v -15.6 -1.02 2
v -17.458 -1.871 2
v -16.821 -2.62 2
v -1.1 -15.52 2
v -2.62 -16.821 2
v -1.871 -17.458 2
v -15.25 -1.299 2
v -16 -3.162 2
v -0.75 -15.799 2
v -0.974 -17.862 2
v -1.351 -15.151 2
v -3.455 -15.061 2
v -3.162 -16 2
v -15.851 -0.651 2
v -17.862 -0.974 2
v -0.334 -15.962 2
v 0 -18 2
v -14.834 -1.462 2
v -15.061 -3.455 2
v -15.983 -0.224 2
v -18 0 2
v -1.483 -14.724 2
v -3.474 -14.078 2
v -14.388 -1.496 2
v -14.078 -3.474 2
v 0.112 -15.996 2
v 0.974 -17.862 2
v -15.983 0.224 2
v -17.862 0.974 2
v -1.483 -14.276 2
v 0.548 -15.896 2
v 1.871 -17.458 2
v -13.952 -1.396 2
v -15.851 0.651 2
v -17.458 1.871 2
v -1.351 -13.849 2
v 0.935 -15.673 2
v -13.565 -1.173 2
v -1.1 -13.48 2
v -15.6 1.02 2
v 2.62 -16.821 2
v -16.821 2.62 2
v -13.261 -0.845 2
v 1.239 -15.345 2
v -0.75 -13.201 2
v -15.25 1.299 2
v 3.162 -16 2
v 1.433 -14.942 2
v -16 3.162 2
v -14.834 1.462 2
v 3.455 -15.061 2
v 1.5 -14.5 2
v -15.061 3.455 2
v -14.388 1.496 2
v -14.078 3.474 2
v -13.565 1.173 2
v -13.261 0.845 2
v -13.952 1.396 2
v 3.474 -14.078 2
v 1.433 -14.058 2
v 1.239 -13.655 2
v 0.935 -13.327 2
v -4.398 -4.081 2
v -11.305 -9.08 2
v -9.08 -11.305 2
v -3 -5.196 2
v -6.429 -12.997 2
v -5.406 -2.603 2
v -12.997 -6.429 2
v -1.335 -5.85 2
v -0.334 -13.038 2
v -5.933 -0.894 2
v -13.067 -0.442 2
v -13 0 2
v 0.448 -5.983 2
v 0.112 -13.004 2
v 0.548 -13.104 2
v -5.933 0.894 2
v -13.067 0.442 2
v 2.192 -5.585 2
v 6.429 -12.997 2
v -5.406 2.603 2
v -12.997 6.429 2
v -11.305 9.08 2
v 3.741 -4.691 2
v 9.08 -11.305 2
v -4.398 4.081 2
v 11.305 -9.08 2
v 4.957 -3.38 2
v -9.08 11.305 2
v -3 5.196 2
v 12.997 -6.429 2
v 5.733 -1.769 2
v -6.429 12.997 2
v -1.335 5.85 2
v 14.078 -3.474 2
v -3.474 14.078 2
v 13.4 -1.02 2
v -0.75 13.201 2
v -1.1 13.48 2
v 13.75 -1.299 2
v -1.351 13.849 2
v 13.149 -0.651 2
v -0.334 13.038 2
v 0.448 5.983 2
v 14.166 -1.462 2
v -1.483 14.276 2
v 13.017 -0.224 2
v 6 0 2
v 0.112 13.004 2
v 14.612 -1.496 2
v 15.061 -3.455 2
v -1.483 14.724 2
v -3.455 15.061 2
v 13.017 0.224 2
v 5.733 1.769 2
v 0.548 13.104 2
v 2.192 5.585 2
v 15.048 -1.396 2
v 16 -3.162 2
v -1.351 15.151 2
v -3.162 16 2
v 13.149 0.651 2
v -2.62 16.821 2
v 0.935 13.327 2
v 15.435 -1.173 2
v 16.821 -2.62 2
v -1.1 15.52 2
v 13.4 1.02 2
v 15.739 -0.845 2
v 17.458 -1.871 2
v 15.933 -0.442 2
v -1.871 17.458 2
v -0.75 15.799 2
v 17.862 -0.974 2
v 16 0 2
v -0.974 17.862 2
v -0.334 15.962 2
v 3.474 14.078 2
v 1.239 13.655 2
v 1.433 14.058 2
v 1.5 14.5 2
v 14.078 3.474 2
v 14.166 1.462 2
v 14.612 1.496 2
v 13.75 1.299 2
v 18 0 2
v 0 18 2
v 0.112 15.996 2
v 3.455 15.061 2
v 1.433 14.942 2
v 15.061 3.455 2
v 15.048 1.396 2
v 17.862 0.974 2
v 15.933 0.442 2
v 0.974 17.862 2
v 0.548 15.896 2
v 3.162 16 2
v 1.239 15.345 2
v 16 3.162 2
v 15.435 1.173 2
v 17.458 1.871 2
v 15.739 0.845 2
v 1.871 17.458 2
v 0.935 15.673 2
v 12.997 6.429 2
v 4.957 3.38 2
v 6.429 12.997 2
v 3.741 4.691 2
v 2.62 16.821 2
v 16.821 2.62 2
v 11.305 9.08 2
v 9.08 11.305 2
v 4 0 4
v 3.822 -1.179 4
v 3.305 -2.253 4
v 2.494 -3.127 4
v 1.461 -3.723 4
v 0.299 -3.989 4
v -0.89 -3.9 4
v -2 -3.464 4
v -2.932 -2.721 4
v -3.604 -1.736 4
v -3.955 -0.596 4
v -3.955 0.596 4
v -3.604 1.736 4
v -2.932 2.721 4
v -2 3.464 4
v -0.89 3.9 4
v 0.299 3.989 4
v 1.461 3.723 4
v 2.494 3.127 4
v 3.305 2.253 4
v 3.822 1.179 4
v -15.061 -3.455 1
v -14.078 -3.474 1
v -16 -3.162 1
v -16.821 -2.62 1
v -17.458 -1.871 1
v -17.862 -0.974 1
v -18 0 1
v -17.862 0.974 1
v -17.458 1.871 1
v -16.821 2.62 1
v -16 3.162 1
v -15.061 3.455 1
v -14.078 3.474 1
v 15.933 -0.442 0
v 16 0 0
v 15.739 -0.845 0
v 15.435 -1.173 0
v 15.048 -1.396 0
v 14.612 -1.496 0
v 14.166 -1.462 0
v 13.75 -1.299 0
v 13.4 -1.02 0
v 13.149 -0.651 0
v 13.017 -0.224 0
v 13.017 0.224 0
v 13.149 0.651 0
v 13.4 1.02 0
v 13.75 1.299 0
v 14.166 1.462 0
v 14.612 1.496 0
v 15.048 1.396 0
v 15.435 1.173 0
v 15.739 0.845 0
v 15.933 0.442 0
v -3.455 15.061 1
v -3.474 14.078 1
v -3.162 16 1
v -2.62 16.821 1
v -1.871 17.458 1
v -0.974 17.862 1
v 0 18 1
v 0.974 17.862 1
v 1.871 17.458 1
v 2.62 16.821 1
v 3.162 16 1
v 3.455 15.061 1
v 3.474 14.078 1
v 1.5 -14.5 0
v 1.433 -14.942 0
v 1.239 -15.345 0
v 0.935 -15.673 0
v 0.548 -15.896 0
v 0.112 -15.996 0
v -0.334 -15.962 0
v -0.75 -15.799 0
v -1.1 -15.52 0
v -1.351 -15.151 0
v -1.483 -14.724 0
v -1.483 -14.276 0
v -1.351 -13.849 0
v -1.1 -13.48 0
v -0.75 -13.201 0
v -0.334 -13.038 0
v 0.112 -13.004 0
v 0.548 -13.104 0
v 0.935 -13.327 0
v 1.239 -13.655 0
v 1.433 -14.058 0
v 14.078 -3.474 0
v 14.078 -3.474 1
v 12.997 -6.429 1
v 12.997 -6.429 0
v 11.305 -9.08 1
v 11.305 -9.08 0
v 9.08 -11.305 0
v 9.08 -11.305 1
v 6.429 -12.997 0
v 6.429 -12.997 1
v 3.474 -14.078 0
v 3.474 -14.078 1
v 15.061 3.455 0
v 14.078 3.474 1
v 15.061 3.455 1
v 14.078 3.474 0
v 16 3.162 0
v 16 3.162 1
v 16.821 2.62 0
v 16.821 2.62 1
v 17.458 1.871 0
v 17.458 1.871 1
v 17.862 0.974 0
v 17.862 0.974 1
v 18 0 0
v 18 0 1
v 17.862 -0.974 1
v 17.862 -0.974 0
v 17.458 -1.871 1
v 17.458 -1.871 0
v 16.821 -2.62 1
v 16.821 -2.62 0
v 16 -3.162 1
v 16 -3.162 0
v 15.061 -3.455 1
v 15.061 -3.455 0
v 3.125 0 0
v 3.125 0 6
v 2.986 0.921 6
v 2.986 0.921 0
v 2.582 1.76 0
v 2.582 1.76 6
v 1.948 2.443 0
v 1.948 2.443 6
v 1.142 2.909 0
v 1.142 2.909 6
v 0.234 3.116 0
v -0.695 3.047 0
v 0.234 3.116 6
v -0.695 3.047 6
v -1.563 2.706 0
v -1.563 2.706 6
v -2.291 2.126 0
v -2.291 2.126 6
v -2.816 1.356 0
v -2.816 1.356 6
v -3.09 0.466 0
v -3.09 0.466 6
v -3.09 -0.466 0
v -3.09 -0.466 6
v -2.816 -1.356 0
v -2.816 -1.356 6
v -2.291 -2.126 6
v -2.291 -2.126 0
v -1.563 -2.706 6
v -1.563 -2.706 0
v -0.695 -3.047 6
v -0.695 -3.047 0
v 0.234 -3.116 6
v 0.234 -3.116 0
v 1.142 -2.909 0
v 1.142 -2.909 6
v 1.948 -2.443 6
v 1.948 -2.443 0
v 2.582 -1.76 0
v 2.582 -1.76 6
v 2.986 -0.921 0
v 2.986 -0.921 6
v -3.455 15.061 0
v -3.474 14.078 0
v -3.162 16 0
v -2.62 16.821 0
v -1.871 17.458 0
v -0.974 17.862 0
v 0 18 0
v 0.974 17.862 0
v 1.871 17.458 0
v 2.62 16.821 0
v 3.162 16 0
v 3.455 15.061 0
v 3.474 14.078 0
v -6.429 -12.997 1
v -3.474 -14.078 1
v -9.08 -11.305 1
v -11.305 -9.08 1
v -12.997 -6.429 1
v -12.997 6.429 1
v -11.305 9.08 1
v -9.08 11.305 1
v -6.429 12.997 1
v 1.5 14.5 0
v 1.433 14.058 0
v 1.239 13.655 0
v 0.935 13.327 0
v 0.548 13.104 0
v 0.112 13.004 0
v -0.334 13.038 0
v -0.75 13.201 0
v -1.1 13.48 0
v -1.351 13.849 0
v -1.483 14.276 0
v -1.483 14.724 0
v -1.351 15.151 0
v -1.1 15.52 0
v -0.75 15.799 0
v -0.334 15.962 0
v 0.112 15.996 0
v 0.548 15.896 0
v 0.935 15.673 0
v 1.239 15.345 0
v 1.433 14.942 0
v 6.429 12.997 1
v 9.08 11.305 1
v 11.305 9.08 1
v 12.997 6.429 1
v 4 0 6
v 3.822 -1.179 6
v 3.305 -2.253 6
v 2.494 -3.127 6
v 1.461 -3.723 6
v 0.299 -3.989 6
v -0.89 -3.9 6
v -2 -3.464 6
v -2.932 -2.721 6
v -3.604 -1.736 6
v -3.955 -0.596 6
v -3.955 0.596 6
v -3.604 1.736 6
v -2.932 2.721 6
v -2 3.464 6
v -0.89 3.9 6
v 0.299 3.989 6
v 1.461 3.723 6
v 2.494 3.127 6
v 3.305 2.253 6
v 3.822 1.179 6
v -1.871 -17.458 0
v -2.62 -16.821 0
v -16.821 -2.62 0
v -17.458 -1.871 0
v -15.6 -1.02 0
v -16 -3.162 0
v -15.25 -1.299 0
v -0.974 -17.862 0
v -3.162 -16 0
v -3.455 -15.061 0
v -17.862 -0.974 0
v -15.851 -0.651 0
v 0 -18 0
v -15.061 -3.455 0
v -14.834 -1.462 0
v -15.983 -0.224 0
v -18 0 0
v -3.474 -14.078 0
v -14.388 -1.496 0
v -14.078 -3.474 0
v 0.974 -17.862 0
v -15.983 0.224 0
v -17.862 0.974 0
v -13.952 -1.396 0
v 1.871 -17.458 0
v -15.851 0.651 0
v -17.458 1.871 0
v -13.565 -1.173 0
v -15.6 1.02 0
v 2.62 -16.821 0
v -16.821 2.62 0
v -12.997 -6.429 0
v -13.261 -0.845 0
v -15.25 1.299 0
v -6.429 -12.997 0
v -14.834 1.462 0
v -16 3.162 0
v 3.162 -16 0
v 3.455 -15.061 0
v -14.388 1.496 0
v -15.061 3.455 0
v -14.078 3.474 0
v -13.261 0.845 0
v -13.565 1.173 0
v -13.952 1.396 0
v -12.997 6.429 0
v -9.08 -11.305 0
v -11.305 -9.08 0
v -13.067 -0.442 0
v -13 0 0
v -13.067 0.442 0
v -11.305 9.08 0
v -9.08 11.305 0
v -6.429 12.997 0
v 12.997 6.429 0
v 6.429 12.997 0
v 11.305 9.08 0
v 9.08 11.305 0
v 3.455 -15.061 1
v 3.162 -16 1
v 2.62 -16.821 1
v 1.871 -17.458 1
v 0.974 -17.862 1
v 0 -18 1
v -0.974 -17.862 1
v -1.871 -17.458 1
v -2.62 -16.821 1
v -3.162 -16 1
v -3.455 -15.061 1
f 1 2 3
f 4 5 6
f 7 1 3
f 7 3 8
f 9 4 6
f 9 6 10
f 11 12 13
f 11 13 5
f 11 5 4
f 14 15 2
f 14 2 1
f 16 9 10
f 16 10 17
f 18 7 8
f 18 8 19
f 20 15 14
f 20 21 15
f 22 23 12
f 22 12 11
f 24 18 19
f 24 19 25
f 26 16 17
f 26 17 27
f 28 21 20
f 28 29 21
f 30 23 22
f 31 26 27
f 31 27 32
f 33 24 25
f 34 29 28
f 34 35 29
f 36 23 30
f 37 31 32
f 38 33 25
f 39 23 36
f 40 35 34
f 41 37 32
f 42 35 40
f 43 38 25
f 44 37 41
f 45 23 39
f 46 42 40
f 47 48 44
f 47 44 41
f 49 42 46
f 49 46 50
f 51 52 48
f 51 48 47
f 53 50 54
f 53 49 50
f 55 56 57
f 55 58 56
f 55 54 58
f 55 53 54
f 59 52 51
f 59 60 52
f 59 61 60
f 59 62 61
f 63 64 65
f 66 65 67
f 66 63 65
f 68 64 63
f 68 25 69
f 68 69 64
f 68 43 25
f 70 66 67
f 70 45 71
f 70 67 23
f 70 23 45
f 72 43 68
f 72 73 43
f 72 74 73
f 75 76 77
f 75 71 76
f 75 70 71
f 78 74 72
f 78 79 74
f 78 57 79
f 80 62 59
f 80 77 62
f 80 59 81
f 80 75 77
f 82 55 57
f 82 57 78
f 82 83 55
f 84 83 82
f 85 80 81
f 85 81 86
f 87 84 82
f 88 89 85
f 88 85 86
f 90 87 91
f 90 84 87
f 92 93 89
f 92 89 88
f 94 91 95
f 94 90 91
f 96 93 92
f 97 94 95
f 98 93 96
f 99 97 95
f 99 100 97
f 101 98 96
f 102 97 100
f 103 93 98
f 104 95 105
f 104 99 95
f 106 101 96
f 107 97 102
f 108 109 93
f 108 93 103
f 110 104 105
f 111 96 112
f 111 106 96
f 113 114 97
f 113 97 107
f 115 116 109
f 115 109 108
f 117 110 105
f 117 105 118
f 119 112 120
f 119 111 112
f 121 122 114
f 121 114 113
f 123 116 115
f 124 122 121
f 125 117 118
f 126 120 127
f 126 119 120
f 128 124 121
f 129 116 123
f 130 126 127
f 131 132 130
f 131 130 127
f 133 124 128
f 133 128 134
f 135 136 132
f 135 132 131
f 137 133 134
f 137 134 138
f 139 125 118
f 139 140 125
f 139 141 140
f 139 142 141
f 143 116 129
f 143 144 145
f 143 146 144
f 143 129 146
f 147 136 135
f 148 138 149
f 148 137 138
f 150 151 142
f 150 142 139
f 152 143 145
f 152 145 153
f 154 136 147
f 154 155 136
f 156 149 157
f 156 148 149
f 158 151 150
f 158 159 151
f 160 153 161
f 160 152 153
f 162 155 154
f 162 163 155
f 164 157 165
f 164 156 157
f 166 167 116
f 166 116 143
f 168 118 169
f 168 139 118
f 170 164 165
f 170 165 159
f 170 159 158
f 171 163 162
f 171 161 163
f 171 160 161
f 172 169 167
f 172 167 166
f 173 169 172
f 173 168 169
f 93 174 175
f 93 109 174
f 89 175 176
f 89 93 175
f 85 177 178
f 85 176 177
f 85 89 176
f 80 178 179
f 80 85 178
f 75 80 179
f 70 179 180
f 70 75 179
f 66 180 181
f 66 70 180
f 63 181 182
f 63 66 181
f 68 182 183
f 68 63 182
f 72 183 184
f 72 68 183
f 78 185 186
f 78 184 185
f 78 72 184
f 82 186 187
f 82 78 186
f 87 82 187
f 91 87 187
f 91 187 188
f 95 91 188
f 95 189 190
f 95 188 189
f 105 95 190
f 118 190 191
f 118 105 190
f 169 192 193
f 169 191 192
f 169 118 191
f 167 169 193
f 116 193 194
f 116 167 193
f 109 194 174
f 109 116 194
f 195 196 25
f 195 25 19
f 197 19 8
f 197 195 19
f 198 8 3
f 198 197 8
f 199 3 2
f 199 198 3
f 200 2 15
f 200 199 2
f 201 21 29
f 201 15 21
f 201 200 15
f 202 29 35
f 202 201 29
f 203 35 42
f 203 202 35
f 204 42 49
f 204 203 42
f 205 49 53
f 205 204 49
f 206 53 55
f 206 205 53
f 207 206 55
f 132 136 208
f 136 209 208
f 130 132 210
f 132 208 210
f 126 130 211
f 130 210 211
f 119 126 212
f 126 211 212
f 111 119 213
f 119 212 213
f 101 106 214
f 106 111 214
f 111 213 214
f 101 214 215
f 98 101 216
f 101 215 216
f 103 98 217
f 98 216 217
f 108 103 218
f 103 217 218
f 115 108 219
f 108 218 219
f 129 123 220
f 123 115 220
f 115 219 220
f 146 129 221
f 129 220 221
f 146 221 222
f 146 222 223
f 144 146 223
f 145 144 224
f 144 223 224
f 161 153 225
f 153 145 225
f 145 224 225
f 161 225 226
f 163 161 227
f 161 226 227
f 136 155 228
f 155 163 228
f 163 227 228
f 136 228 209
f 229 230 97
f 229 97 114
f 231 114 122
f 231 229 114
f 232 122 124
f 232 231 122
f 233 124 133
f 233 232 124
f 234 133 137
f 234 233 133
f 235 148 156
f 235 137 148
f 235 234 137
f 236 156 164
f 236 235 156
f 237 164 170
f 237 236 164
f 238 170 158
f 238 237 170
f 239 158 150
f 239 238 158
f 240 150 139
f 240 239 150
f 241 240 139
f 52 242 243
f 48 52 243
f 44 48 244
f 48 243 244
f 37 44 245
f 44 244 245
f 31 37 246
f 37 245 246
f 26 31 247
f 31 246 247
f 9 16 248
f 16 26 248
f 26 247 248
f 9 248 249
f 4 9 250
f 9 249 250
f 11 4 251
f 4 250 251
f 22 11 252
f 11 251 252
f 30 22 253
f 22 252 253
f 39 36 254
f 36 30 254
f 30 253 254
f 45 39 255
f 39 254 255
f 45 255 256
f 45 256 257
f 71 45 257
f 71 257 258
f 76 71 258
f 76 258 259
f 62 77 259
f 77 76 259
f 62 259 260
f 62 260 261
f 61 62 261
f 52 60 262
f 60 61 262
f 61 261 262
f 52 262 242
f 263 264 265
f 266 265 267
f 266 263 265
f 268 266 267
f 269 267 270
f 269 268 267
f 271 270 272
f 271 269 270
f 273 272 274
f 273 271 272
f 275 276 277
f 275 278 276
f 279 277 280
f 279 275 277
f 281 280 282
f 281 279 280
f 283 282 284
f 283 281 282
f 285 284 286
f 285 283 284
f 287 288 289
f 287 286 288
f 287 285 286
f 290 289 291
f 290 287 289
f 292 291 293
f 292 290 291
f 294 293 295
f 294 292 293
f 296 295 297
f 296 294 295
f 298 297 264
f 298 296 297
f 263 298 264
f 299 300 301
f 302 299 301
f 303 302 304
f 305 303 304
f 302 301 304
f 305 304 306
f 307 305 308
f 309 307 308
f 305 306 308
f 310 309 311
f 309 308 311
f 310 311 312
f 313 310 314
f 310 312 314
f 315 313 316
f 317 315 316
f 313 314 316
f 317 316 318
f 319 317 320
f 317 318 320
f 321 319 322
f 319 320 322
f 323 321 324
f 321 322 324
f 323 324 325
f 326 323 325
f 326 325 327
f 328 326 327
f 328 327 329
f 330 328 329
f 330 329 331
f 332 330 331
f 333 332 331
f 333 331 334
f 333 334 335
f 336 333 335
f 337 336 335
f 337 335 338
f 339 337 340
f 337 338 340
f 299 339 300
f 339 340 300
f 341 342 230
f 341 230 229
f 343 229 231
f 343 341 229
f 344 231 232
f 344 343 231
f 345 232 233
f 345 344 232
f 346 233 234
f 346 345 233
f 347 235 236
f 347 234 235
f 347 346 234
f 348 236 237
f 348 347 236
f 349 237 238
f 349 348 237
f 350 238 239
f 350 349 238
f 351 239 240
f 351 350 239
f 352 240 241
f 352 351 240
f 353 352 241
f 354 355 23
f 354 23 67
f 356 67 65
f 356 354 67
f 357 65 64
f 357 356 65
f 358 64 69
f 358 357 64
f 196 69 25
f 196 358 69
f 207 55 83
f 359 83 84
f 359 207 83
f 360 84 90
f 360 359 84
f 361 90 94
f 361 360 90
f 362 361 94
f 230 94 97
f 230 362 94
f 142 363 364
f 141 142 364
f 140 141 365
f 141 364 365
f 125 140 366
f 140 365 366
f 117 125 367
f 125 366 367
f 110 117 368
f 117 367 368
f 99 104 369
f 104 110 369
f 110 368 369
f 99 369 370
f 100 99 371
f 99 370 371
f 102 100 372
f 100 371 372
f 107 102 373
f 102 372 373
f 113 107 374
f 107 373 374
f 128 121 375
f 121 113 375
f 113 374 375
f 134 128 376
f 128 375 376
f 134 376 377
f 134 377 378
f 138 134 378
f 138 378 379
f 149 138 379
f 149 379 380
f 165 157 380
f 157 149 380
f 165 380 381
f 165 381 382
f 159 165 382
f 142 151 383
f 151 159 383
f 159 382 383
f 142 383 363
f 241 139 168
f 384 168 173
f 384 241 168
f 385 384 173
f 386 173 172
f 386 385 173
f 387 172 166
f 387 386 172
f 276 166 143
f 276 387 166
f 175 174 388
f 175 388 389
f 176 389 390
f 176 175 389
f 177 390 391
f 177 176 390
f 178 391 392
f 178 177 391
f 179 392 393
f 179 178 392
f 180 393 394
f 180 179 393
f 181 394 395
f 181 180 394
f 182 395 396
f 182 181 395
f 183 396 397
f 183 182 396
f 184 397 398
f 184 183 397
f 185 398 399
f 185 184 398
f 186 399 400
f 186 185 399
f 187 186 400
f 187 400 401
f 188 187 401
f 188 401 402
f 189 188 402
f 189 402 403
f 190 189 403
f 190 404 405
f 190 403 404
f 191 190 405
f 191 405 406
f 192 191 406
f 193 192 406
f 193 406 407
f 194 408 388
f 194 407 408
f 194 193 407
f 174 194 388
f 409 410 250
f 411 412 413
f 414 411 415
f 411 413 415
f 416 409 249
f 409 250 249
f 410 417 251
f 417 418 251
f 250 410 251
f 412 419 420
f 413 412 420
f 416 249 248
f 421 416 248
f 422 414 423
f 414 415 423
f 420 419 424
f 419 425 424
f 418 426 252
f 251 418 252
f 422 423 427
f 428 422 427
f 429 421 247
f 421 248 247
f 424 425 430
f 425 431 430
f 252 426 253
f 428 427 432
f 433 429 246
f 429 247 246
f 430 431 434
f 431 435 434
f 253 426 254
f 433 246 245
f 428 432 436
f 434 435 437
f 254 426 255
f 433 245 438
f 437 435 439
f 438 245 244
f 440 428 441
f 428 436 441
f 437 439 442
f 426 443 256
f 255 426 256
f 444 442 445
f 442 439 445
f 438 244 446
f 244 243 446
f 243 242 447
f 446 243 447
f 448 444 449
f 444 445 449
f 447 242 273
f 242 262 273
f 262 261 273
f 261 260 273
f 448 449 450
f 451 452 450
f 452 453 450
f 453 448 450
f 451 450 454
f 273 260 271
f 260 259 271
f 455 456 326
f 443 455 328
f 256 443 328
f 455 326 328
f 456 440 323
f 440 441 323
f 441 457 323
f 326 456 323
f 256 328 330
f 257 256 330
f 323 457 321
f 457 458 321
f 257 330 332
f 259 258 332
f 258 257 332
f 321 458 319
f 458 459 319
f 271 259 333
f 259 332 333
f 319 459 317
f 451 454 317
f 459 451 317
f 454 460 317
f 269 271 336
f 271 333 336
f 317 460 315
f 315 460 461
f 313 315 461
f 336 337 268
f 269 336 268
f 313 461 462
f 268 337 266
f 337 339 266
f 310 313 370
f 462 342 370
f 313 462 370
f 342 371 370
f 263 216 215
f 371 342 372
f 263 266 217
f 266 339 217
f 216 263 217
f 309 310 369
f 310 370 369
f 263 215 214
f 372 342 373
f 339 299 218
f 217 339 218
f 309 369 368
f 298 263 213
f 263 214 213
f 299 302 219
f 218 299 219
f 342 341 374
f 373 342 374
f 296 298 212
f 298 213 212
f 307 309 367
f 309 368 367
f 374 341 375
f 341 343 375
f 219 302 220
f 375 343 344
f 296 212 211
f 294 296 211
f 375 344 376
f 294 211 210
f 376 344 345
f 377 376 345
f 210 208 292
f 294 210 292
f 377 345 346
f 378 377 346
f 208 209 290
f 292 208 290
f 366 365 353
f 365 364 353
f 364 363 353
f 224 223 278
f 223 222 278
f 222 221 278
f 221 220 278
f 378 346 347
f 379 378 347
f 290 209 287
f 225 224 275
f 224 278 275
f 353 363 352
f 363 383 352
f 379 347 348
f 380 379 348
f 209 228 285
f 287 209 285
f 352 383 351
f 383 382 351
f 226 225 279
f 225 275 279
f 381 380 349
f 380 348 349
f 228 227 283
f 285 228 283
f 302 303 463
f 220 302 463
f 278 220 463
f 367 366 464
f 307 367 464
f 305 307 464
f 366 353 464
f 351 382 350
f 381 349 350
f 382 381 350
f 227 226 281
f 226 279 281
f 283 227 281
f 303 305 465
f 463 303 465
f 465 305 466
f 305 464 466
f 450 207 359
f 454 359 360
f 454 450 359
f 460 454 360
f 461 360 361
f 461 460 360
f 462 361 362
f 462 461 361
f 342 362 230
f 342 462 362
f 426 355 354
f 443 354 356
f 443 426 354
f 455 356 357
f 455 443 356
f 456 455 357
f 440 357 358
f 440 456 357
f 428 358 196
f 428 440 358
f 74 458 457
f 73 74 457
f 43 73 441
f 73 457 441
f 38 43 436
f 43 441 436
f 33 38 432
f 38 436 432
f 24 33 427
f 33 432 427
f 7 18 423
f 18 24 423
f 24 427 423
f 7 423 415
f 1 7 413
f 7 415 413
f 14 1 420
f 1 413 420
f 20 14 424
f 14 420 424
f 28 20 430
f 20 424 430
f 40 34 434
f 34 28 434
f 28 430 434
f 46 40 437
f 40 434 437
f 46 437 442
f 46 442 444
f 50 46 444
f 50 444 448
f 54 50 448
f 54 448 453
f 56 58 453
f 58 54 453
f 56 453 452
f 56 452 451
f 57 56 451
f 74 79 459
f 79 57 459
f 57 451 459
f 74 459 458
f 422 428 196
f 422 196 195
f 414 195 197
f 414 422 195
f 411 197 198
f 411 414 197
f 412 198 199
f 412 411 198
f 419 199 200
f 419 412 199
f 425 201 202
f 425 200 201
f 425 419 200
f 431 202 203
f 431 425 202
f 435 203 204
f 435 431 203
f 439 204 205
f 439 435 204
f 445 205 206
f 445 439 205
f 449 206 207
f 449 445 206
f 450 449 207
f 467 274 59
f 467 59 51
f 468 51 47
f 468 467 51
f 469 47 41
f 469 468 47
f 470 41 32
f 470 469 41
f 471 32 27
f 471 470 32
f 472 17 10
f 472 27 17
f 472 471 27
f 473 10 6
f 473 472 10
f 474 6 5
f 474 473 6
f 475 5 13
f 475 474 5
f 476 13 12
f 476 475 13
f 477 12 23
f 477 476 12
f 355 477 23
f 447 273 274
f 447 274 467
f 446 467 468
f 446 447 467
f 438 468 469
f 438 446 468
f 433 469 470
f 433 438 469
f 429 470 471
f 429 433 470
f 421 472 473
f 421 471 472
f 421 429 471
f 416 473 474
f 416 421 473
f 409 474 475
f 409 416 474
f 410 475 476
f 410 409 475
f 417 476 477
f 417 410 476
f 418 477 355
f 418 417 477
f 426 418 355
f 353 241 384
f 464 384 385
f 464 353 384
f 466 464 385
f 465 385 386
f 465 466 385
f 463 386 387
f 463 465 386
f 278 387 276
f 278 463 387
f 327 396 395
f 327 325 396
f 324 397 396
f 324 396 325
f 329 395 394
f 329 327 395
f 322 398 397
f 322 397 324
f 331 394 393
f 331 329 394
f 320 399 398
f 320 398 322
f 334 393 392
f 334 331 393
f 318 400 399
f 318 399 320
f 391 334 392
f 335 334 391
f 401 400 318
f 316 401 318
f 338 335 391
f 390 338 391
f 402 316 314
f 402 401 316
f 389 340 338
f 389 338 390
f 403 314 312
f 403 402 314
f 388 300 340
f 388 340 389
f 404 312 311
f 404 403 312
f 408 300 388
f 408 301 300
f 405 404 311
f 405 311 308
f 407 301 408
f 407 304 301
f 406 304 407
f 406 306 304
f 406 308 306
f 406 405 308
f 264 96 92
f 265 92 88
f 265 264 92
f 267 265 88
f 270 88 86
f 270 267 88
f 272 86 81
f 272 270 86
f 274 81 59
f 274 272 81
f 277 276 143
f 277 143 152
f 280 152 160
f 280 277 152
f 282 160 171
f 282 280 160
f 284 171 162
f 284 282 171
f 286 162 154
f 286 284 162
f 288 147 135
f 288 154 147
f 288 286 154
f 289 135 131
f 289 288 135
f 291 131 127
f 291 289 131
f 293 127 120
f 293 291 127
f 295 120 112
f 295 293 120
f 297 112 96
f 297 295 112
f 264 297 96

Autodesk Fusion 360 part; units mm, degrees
sketch "Sketch1" plane through (0, 0, 0) normal (0, 0, 1) x (1, 0, 0)
  circle A0 centre (0, 0) radius 11
  circle A1 centre (0, 0) radius 12.5
  circle A2 centre (0, 0) radius 14.5
  line L0 (0, 0) -> (0, 14.5)
  line L1 (0, 0) -> (14.5, 0)
  line L2 (0, 0) -> (-14.5, 0)
  line L3 (0, 0) -> (0, -14.5)
  circle A3 centre (0, 14.5) radius 3.5
  circle A4 centre (14.5, 0) radius 3.5
  circle A5 centre (0, -14.5) radius 3.5
  circle A6 centre (-14.5, 0) radius 3.5
  circle A7 centre (-14.5, 0) radius 1.5
  circle A8 centre (0, 14.5) radius 1.5
  circle A9 centre (14.5, 0) radius 1.5
  circle A10 centre (0, -14.5) radius 1.5
  dimension "d1" = 22
  dimension "d2" = 25
  dimension "d3" = 29
  dimension "d4" = 7
  dimension "d5" = 3
  dimension "d6" = 3
  dimension "d7" = 3
  dimension "d8" = 3
extrude "Extrude1" add sketch "Sketch1" along normal blind 1 contours A0 A1 A4 A5 | A1 L1 A4 | A0 A1 A3 A4 | A1 L1 A4 | A1 L0 A3 | A0 A1 A3 A6 | A1 L0 A3 | A0 A1 A5 A6 | A1 L3 A5 | A1 L3 A5 | A1 A2 L1 A4 A9 | A1 A2 L1 A4 A9 | A1 A2 A3 A4 | A1 A2 A4 A5 | A1 L2 A6 | A1 L2 A6 | A1 A2 L0 A3 A8 | A1 A2 L0 A3 A8 | A1 A2 A3 A6 | A1 A2 L3 A5 A10 | A1 A2 L3 A5 A10 | A1 A2 A5 A6 | A2 A4 A9 | A1 A2 L2 A6 A7 | A1 A2 L2 A6 A7 | A2 A3 A8 | A2 A5 A10 | A2 A6 A7
sketch "Sketch2" plane through (0, 0, 1) normal (0, 0, 1) x (1, 0, 0)
  circle A0 centre (0, -14.5) radius 1.5
  circle A1 centre (14.5, 0) radius 1.5
  circle A2 centre (-14.5, 0) radius 1.5
  circle A3 centre (0, 14.5) radius 1.5
  circle A4 centre (0, 0) radius 11
  arc A5 (-3.4744, 14.0776) -> (-14.0776, 3.4744) centre (0, 0) ccw
  arc A6 (-14.0776, 3.4744) -> (-14.0776, -3.4744) centre (-14.5, 0) ccw
  arc A7 (-14.0776, -3.4744) -> (-3.4744, -14.0776) centre (0, 0) ccw
  arc A8 (-3.4744, -14.0776) -> (3.4744, -14.0776) centre (0, -14.5) ccw
  arc A9 (3.4744, -14.0776) -> (14.0776, -3.4744) centre (0, 0) ccw
  arc A10 (14.0776, -3.4744) -> (14.0776, 3.4744) centre (14.5, 0) ccw
  arc A11 (14.0776, 3.4744) -> (3.4744, 14.0776) centre (0, 0) ccw
  arc A12 (3.4744, 14.0776) -> (-3.4744, 14.0776) centre (0, 14.5) ccw
  circle A13 centre (0, 0) radius 11
  circle A14 centre (0, 0) radius 12.375
  circle A15 centre (0, 0) radius 14.5
  circle A16 centre (0, 14.5) radius 3.5
  circle A17 centre (14.5, 0) radius 3.5
  circle A18 centre (0, -14.5) radius 3.5
  circle A19 centre (-14.5, 0) radius 3.5
  dimension "d11" = 24.75
extrude "Extrude2" add sketch "Sketch2" along normal blind 1.25 contours A0 A8 A15 A18 | A0 A14 A15 A18 | A9 A14 A15 A17 A18 | A7 A14 A15 A18 A19 | A1 A10 A15 A17 | A1 A14 A15 A17 | A2 A6 A15 A19 | A2 A14 A15 A19 | A5 A14 A15 A16 A19 | A11 A14 A15 A16 A17 | A3 A12 A15 A16 | A3 A14 A15 A16
extrude "Extrude3" cut 1 faces at (-2.5265, -13.3305, 2.25) along direction (0, 0, -1) blind 1.25
sketch "Sketch3" plane through (0, 0, 1) normal (0, 0, 1) x (1, 0, 0)
  arc A0 (-3.4744, 14.0776) -> (-14.0776, 3.4744) centre (0, 0) ccw
  arc A1 (-14.0776, 3.4744) -> (-14.0776, -3.4744) centre (-14.5, 0) ccw
  arc A2 (-14.0776, -3.4744) -> (-3.4744, -14.0776) centre (0, 0) ccw
  arc A3 (-3.4744, -14.0776) -> (3.4744, -14.0776) centre (0, -14.5) ccw
  arc A4 (3.4744, -14.0776) -> (14.0776, -3.4744) centre (0, 0) ccw
  arc A5 (14.0776, -3.4744) -> (14.0776, 3.4744) centre (14.5, 0) ccw
  arc A6 (14.0776, 3.4744) -> (3.4744, 14.0776) centre (0, 0) ccw
  arc A7 (3.4744, 14.0776) -> (-3.4744, 14.0776) centre (0, 14.5) ccw
  circle A8 centre (0, 14.5) radius 1.5
  circle A9 centre (14.5, 0) radius 1.5
  circle A10 centre (-14.5, 0) radius 1.5
  circle A11 centre (0, -14.5) radius 1.5
  circle A12 centre (0, 0) radius 11
  circle A13 centre (0, 0) radius 3.05
  dimension "d16" = 6.1
extrude "Extrude4" add sketch "Sketch3" along normal blind 2 contours A0 A1 A2 A3 A4 A5 A6 A7 | A12
sketch "Sketch4" plane through (0, 0, 3) normal (0, 0, 1) x (1, 0, 0)
  circle A0 centre (-14.5, 0) radius 1.5
  circle A1 centre (0, 14.5) radius 1.5
  circle A2 centre (0, 0) radius 3.05
  circle A3 centre (0, -14.5) radius 1.5
  circle A4 centre (14.5, 0) radius 1.5
  arc A5 (3.4744, 14.0776) -> (-3.4744, 14.0776) centre (0, 14.5) ccw
  arc A6 (-3.4744, 14.0776) -> (-14.0776, 3.4744) centre (0, 0) ccw
  arc A7 (-14.0776, 3.4744) -> (-14.0776, -3.4744) centre (-14.5, 0) ccw
  arc A8 (-14.0776, -3.4744) -> (-3.4744, -14.0776) centre (0, 0) ccw
  arc A9 (-3.4744, -14.0776) -> (3.4744, -14.0776) centre (0, -14.5) ccw
  arc A10 (3.4744, -14.0776) -> (14.0776, -3.4744) centre (0, 0) ccw
  arc A11 (14.0776, -3.4744) -> (14.0776, 3.4744) centre (14.5, 0) ccw
  arc A12 (14.0776, 3.4744) -> (3.4744, 14.0776) centre (0, 0) ccw
  circle A13 centre (0, 0) radius 1.5
  dimension "d19" = 3
extrude "Extrude5" cut sketch "Sketch4" against normal blind 1 contours A5 A6 A7 A8 A9 A10 A11 A12
sketch "Sketch5" plane through (0, 0, 2) normal (0, 0, 1) x (1, 0, 0)
  circle A0 centre (0, -14.5) radius 1.5
  circle A1 centre (0, 0) radius 3.05
  circle A2 centre (14.5, 0) radius 1.5
  circle A3 centre (0, 14.5) radius 1.5
  circle A4 centre (-14.5, 0) radius 1.5
  arc A5 (14.0776, 3.4744) -> (3.4744, 14.0776) centre (0, 0) ccw
  arc A6 (3.4744, 14.0776) -> (-3.4744, 14.0776) centre (0, 14.5) ccw
  arc A7 (-3.4744, 14.0776) -> (-14.0776, 3.4744) centre (0, 0) ccw
  arc A8 (-14.0776, 3.4744) -> (-14.0776, -3.4744) centre (-14.5, 0) ccw
  arc A9 (-14.0776, -3.4744) -> (-3.4744, -14.0776) centre (0, 0) ccw
  arc A10 (-3.4744, -14.0776) -> (3.4744, -14.0776) centre (0, -14.5) ccw
  arc A11 (3.4744, -14.0776) -> (14.0776, -3.4744) centre (0, 0) ccw
  arc A12 (14.0776, -3.4744) -> (14.0776, 3.4744) centre (14.5, 0) ccw
  circle A13 centre (0, 0) radius 3.05
  circle A14 centre (0, 0) radius 4
  dimension "d22" = 8
extrude "Extrude6" add sketch "Sketch5" along normal blind 4 contours A14
chamfer "Chamfer1" distance 2 angle 45 1 edges at (-3.7293, 1.4465, 2)
extrude "Extrude7" add 1 faces at (8.2977, -0.698, 1) along direction (0, 0, -1) blind 1
sketch "Sketch7" plane through (0, 0, 6) normal (0, 0, 1) x (1, 0, 0)
  circle A0 centre (0, 0) radius 3.05
  circle A1 centre (0, 0) radius 4
  circle A2 centre (0, 0) radius 3.125
  dimension "d28" = 6.25
extrude "Extrude8" cut sketch "Sketch7" against normal blind 100 contours A2
